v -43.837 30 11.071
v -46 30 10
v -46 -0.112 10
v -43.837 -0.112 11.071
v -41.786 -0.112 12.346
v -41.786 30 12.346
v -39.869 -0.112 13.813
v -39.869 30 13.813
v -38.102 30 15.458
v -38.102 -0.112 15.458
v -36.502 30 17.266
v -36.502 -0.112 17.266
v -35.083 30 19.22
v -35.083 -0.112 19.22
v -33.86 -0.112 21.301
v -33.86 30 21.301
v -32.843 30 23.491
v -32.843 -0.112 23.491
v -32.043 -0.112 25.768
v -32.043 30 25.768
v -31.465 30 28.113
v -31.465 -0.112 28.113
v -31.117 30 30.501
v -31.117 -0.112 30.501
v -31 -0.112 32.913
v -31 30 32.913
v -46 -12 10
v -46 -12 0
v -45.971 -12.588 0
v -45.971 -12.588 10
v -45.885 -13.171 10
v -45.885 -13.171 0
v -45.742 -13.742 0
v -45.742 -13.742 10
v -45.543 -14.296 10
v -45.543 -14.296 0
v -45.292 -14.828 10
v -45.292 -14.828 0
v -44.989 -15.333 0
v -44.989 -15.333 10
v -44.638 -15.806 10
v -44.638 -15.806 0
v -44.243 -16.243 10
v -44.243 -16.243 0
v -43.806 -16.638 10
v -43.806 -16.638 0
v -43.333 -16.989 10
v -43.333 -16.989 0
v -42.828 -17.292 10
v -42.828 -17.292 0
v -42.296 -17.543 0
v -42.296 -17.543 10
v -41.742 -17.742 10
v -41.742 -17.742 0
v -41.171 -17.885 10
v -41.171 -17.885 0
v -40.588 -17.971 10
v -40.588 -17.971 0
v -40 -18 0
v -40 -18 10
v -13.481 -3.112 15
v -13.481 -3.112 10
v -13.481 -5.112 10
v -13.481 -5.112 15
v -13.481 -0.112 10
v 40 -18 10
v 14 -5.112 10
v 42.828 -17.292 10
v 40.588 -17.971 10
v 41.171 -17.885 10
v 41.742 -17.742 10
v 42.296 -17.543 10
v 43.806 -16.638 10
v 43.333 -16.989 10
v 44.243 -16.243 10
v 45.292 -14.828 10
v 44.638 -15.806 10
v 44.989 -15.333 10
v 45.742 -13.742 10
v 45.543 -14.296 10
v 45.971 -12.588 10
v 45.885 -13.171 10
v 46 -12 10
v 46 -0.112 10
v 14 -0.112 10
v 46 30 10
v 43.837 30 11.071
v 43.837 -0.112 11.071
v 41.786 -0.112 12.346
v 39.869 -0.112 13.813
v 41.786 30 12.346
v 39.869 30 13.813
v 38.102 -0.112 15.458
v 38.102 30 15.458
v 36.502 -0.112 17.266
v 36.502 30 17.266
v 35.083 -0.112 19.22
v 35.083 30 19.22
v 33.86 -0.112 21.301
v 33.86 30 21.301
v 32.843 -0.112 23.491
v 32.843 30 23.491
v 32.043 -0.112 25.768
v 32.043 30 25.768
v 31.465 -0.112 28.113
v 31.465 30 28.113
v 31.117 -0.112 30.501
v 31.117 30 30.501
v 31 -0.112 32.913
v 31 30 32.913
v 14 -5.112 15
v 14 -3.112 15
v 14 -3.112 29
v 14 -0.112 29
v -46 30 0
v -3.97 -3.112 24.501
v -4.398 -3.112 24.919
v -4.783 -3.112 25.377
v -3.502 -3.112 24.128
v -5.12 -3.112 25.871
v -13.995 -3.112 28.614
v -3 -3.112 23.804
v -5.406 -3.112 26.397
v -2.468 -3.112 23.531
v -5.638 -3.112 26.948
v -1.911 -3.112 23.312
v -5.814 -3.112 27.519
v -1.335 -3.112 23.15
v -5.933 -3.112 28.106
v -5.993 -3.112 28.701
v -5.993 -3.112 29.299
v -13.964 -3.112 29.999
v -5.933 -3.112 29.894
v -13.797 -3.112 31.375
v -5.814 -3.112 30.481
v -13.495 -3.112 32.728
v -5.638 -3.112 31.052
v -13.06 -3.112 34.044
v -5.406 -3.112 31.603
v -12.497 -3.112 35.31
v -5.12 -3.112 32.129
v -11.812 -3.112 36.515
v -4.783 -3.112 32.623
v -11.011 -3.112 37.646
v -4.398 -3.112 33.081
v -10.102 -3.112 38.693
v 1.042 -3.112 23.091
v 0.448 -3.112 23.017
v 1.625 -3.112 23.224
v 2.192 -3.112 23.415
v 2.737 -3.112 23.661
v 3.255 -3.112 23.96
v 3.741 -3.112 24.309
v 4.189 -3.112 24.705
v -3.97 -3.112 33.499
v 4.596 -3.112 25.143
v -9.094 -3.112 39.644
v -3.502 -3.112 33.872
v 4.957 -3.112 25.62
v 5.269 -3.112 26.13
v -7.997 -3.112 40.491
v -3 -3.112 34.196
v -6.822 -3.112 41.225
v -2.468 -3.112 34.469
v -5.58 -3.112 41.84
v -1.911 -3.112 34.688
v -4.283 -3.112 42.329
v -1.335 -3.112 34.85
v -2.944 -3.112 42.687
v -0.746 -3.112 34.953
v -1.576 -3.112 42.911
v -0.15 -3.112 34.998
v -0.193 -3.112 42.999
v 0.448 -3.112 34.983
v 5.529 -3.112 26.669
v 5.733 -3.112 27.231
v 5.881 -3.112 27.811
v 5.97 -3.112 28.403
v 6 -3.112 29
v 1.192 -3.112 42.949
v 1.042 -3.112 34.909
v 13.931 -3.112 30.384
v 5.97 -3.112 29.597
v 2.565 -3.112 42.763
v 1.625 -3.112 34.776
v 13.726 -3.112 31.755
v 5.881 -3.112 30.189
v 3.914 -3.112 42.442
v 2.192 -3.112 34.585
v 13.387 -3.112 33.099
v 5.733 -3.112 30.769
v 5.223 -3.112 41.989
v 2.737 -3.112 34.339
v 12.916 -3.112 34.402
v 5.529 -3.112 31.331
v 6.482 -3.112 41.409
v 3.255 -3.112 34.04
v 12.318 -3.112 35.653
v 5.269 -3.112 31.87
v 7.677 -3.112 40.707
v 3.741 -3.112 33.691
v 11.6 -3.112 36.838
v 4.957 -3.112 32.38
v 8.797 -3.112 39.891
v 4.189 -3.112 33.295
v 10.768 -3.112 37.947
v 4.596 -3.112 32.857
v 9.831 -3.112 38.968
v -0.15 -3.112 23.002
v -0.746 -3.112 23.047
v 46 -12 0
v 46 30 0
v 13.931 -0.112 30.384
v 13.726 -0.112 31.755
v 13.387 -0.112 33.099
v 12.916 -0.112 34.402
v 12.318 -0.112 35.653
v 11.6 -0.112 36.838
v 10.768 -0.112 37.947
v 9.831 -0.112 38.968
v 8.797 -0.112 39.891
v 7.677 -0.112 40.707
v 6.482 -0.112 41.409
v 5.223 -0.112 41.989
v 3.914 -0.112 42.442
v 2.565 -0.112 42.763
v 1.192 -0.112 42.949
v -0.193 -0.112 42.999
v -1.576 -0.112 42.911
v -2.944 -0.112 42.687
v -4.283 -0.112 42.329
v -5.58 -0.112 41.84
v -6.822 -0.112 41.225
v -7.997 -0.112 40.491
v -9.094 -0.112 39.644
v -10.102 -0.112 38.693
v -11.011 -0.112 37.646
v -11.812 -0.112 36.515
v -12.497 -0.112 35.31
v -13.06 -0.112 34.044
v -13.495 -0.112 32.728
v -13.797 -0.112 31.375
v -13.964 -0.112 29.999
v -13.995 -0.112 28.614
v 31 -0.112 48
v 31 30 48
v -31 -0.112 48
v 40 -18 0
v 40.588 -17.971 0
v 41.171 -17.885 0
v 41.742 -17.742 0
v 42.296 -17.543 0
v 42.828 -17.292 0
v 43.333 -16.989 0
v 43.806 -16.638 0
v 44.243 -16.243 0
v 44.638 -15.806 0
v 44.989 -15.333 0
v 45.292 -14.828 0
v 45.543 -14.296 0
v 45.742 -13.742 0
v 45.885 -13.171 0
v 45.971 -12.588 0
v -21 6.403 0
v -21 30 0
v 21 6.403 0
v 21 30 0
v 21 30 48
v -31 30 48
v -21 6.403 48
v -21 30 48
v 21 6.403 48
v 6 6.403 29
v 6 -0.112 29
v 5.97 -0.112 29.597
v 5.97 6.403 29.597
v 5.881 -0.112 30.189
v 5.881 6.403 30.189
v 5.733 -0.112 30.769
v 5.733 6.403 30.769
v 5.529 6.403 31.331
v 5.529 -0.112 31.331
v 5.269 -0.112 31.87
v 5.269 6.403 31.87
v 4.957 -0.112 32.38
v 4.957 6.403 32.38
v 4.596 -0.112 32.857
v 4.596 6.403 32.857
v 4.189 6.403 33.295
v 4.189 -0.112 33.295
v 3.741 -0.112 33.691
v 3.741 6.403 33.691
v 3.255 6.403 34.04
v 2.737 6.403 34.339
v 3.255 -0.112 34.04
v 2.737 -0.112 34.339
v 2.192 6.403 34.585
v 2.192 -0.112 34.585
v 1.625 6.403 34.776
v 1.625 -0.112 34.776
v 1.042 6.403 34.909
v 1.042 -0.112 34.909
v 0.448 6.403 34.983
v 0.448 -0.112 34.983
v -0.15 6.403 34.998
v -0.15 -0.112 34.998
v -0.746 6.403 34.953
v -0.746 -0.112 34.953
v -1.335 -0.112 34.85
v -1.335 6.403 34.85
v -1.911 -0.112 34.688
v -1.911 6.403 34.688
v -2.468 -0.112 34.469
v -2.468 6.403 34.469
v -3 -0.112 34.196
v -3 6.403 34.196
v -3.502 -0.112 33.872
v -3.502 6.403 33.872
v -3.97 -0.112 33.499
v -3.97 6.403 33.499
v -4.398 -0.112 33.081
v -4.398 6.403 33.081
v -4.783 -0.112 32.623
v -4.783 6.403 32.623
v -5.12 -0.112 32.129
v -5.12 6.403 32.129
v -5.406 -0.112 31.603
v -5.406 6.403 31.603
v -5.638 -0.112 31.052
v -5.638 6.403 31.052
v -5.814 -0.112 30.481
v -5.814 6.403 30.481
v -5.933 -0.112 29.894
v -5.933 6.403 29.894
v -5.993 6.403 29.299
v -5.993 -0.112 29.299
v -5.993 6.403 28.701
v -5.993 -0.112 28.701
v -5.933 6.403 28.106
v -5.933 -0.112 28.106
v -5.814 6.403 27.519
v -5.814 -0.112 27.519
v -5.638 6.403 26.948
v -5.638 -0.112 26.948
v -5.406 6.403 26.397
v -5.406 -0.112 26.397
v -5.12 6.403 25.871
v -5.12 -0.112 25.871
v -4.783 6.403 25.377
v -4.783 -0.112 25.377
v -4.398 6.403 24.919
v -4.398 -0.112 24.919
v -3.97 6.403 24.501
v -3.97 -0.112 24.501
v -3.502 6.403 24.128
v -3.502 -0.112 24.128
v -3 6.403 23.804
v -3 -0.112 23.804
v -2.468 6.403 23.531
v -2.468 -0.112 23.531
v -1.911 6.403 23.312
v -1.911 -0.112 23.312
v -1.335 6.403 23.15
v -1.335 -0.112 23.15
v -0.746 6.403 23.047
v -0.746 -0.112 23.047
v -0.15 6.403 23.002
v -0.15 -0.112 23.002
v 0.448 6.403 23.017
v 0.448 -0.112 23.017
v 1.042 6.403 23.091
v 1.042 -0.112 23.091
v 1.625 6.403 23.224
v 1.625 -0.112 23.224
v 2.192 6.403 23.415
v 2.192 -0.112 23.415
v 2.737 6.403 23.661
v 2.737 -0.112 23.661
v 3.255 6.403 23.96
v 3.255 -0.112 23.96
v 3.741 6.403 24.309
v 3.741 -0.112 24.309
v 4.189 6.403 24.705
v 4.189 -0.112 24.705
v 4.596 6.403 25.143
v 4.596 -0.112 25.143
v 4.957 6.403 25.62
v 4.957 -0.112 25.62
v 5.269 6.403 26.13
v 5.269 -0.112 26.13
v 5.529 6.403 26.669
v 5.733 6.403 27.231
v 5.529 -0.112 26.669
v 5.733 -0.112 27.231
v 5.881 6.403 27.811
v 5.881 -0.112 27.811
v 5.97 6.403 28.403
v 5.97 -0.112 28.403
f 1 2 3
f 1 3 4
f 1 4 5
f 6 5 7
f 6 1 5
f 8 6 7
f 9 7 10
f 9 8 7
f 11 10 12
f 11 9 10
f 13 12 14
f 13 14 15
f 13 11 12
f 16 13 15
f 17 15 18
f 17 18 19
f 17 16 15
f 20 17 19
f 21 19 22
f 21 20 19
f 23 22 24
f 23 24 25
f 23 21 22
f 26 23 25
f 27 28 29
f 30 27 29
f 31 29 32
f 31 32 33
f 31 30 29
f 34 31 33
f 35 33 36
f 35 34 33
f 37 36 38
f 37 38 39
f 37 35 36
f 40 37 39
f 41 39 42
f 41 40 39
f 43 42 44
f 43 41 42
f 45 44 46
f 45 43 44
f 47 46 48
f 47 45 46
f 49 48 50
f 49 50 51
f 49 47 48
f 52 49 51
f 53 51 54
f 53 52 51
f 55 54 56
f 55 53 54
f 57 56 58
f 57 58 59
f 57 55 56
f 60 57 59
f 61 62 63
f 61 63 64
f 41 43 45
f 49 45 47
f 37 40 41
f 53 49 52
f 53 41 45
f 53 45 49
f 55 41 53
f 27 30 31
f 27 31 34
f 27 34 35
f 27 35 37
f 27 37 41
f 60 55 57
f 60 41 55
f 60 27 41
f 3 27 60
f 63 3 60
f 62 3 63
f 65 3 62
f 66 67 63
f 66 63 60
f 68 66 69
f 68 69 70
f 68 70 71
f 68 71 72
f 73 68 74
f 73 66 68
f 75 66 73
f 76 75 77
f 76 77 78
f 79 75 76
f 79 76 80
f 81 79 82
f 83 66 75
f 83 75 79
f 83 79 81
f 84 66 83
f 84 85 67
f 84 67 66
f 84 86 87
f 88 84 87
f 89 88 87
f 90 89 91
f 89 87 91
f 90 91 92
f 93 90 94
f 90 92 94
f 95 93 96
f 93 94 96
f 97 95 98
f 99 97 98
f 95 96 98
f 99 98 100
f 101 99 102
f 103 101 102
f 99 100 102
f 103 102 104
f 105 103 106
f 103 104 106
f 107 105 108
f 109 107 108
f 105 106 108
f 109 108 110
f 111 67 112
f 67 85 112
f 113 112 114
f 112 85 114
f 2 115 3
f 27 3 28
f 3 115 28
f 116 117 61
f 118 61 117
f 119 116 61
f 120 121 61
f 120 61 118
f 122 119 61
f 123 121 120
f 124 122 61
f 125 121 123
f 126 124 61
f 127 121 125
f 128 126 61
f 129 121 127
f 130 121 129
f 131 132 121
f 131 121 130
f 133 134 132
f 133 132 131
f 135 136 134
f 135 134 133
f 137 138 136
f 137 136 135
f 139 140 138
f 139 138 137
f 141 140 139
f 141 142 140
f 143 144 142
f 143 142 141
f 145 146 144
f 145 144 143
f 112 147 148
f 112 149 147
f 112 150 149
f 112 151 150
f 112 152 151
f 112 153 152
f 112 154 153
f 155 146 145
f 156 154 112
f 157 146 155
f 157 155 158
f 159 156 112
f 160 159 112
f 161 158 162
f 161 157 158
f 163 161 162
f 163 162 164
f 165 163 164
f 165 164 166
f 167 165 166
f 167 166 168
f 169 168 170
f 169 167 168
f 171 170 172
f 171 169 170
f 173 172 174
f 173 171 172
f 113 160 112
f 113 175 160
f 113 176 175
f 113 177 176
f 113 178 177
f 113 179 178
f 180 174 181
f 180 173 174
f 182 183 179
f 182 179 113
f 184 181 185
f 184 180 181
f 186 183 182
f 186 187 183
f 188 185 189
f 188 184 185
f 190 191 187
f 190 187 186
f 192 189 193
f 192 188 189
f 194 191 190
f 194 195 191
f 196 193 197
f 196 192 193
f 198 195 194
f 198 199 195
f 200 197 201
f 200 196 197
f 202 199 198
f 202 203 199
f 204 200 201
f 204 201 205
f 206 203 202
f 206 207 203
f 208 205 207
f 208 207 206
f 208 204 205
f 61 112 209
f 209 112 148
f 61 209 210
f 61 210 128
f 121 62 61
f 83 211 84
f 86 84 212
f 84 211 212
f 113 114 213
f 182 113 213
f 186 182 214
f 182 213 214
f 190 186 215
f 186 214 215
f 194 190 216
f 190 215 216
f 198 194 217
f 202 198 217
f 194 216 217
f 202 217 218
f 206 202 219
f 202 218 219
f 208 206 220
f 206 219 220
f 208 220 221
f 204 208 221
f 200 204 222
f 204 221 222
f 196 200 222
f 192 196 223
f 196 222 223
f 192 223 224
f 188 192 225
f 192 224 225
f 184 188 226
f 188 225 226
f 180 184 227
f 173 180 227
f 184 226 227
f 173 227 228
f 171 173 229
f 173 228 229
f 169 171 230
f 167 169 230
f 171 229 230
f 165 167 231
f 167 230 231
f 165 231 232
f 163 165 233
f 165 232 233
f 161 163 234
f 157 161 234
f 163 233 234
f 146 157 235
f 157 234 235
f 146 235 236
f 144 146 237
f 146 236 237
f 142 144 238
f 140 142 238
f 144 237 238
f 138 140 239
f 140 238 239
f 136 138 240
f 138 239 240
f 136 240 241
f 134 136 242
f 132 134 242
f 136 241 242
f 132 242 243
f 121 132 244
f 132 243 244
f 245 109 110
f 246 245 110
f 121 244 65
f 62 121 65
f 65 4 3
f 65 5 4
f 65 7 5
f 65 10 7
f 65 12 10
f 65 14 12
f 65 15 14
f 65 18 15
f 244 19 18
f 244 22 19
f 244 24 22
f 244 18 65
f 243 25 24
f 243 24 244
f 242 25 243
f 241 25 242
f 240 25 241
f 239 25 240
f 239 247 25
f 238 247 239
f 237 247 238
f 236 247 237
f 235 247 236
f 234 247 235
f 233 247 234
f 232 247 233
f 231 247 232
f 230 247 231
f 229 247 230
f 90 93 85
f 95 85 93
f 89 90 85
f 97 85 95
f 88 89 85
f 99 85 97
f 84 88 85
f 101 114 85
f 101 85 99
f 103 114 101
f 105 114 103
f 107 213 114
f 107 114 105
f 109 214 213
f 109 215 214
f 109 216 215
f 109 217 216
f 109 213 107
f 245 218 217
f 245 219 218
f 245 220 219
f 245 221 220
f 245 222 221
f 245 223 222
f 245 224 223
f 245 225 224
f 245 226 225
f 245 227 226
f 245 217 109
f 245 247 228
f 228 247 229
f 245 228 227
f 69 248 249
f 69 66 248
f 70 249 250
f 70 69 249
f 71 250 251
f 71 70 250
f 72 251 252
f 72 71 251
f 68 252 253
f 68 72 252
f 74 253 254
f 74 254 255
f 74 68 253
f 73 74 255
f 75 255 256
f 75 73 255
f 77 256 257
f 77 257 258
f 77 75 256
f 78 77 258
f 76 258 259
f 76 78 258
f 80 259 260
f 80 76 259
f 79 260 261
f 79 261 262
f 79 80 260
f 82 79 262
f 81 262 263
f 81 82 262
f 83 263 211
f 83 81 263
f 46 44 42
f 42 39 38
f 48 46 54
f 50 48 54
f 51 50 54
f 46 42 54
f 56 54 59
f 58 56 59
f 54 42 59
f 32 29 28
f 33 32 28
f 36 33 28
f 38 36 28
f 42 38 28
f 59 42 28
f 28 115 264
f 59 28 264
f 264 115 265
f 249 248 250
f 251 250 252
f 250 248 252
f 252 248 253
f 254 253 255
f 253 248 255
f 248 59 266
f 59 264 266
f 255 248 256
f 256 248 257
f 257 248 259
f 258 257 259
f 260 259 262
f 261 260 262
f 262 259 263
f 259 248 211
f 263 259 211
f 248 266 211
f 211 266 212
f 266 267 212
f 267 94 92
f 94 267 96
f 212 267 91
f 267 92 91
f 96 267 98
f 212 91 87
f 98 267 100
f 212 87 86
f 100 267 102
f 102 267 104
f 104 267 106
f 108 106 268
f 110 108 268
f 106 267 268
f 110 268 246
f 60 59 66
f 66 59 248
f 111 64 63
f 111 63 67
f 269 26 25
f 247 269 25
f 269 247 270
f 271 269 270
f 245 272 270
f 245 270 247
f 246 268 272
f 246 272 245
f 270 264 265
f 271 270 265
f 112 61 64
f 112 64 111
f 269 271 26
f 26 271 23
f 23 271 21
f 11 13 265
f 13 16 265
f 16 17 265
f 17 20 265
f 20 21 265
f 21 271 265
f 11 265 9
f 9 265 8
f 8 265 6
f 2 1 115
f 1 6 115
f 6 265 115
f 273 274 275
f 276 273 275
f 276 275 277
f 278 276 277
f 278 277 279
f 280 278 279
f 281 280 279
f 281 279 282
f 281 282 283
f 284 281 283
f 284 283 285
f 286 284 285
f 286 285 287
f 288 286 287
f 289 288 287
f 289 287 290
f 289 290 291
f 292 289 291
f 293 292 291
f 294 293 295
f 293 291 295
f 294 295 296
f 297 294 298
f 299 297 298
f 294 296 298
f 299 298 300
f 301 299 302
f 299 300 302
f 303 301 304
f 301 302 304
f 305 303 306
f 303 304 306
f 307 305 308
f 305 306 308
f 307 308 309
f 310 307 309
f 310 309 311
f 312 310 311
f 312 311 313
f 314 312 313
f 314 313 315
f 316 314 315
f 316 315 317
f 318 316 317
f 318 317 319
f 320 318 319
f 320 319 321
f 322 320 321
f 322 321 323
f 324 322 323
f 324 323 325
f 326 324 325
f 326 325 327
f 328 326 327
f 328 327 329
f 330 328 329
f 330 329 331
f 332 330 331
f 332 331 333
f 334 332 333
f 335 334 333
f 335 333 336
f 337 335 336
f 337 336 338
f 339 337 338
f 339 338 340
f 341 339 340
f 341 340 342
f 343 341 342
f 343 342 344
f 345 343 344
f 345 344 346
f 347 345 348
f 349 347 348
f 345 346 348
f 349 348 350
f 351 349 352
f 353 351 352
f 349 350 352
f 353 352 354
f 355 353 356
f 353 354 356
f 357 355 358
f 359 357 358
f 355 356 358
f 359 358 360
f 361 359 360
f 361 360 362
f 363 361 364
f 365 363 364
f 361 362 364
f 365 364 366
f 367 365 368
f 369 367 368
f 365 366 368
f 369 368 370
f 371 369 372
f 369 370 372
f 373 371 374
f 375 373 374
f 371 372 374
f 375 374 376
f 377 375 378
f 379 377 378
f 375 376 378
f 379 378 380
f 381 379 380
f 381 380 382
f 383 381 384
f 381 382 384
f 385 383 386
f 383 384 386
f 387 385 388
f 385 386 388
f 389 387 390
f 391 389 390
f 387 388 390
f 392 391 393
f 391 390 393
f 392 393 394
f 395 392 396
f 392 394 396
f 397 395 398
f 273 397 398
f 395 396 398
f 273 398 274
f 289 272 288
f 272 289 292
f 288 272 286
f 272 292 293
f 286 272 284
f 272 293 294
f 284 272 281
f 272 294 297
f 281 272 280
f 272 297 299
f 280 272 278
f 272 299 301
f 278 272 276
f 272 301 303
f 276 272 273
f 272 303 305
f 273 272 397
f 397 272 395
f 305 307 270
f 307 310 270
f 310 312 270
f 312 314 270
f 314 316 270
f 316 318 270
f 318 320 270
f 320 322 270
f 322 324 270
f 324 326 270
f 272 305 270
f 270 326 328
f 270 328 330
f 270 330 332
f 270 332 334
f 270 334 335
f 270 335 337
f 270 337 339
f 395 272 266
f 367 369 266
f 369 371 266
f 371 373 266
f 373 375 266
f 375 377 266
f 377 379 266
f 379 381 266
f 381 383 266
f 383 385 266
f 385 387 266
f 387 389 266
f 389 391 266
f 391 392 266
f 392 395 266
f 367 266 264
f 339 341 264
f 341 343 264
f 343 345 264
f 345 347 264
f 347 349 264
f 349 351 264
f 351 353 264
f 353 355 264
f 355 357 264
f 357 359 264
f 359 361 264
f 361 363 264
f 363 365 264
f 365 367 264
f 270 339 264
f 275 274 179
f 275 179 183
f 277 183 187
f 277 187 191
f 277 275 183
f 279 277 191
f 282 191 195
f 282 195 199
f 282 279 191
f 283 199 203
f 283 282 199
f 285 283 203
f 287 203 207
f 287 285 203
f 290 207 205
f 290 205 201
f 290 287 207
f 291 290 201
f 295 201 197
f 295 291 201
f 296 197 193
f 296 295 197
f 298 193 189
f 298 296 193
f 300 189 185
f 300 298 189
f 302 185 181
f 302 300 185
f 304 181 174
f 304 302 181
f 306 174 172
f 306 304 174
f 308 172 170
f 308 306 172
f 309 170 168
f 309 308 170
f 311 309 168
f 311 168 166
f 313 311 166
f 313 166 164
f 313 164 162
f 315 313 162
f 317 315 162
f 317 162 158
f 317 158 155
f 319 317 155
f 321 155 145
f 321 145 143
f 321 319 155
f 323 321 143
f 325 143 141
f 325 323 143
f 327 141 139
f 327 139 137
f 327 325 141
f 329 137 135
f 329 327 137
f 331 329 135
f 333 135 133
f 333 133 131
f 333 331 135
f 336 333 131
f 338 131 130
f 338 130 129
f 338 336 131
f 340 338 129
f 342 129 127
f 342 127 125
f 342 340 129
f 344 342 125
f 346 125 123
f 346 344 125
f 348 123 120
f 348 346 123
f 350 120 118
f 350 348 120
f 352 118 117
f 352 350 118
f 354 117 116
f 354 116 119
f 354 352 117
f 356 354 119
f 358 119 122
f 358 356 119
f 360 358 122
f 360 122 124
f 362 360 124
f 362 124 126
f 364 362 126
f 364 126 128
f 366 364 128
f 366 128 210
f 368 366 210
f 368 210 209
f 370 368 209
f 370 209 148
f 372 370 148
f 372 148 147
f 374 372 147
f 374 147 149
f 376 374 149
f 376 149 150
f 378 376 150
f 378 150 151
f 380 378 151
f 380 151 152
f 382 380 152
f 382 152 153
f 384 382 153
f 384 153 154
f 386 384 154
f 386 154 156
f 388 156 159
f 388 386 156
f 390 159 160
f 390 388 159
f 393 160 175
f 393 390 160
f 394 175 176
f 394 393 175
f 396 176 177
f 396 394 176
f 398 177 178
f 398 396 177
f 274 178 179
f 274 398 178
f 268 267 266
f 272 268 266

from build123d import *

# Parameters (mm, degrees)
F2_DEPTH    = 10
F3_DEPTH    = 48
F4_R        = 6
F5_DEPTH    = 3
F6_W        = 27.4810515978
F6_H        = 5
F7_DEPTH    = 2
F8_DEPTH    = 20
F9_T1_DEPTH = 30.1119658546
F10_R       = 6


# Not quite as in the source:
# - a fillet or chamfer that OpenCascade refuses, or shapes differently, is made with other operations: its cross-section is extruded or revolved along the edge and cut away or added


with BuildPart() as f2:
    # F0 (on Top) → F2 (new body)
    with BuildSketch(Plane.XY):
        Polygon((46, -18), (46, 30), (31, 30), (31, -0.1119658546), (-31, -0.1119658546), (-31, 30), (-46, 30), (-46, -18), align=None)
        Polygon((31, -0.1119658546), (31, 30), (21, 30), (21, 6.4026141707), (-21, 6.4026141707), (-21, 30), (-31, 30), (-31, -0.1119658546), align=None)
    extrude(amount=F2_DEPTH)

    # F1 (on Top) → F3 (join)
    with BuildSketch(Plane.XY):
        Polygon((31, -0.1119658546), (31, 30), (21, 30), (21, 6.4026141707), (-21, 6.4026141707), (-21, 30), (-31, 30), (-31, -0.1119658546), align=None)
    extrude(amount=F3_DEPTH)

    # F4 (on face) → F5 (join)
    with BuildSketch(Plane.XZ.offset(0.1119658546)):
        with BuildLine():
            Line((14, 10), (14, 29))
            ThreePointArc((14, 29), (-0.1930996384, 42.9986682413), (-13.9946732185, 28.6138374607))
            Line((-13.9946732185, 28.6138374607), (-13.4810515978, 10))
            Line((-13.4810515978, 10), (14, 10))
        make_face()
        with Locations((0, 29)):
            Circle(F4_R, mode=Mode.SUBTRACT)
    extrude(amount=F5_DEPTH)

    # F6 (on face) → F7 (join)
    with BuildSketch(Plane.XZ.offset(3.1119658546)):
        with Locations((0.2594742011, 12.5)):
            Rectangle(F6_W, F6_H)
    extrude(amount=F7_DEPTH)

    # F8 (cut): a face of the model
    f8_faces = [f2.faces().sort_by_distance(p)[0] for p in [
        (0, -0.1119658546, 29),
    ]]
    extrude(f8_faces, amount=-F8_DEPTH, mode=Mode.SUBTRACT)

    # F9: fillet of radius 25 on 2 edges, made by hand

    # F9_s2 → F9_t1 (join)
    with BuildSketch(Plane.XZ.offset(-30)):
        with BuildLine():
            ThreePointArc((46, 10), (35.0834993366, 19.2198145372), (31, 32.9128784748))
            Line((31, 32.9128784748), (31, 10))
            Line((31, 10), (46, 10))
        make_face()
        with BuildLine():
            ThreePointArc((-46, 10), (-35.0834993366, 19.2198145372), (-31, 32.9128784748))
            Line((-31, 32.9128784748), (-31, 10))
            Line((-31, 10), (-46, 10))
        make_face()
    extrude(amount=F9_T1_DEPTH)

    # F10
    f10_edges = [f2.edges().sort_by_distance(p)[0] for p in [
        (-46, -18, 5),
        (46, -18, 5),
    ]]
    fillet(f10_edges, radius=F10_R)


solid = f2.part
